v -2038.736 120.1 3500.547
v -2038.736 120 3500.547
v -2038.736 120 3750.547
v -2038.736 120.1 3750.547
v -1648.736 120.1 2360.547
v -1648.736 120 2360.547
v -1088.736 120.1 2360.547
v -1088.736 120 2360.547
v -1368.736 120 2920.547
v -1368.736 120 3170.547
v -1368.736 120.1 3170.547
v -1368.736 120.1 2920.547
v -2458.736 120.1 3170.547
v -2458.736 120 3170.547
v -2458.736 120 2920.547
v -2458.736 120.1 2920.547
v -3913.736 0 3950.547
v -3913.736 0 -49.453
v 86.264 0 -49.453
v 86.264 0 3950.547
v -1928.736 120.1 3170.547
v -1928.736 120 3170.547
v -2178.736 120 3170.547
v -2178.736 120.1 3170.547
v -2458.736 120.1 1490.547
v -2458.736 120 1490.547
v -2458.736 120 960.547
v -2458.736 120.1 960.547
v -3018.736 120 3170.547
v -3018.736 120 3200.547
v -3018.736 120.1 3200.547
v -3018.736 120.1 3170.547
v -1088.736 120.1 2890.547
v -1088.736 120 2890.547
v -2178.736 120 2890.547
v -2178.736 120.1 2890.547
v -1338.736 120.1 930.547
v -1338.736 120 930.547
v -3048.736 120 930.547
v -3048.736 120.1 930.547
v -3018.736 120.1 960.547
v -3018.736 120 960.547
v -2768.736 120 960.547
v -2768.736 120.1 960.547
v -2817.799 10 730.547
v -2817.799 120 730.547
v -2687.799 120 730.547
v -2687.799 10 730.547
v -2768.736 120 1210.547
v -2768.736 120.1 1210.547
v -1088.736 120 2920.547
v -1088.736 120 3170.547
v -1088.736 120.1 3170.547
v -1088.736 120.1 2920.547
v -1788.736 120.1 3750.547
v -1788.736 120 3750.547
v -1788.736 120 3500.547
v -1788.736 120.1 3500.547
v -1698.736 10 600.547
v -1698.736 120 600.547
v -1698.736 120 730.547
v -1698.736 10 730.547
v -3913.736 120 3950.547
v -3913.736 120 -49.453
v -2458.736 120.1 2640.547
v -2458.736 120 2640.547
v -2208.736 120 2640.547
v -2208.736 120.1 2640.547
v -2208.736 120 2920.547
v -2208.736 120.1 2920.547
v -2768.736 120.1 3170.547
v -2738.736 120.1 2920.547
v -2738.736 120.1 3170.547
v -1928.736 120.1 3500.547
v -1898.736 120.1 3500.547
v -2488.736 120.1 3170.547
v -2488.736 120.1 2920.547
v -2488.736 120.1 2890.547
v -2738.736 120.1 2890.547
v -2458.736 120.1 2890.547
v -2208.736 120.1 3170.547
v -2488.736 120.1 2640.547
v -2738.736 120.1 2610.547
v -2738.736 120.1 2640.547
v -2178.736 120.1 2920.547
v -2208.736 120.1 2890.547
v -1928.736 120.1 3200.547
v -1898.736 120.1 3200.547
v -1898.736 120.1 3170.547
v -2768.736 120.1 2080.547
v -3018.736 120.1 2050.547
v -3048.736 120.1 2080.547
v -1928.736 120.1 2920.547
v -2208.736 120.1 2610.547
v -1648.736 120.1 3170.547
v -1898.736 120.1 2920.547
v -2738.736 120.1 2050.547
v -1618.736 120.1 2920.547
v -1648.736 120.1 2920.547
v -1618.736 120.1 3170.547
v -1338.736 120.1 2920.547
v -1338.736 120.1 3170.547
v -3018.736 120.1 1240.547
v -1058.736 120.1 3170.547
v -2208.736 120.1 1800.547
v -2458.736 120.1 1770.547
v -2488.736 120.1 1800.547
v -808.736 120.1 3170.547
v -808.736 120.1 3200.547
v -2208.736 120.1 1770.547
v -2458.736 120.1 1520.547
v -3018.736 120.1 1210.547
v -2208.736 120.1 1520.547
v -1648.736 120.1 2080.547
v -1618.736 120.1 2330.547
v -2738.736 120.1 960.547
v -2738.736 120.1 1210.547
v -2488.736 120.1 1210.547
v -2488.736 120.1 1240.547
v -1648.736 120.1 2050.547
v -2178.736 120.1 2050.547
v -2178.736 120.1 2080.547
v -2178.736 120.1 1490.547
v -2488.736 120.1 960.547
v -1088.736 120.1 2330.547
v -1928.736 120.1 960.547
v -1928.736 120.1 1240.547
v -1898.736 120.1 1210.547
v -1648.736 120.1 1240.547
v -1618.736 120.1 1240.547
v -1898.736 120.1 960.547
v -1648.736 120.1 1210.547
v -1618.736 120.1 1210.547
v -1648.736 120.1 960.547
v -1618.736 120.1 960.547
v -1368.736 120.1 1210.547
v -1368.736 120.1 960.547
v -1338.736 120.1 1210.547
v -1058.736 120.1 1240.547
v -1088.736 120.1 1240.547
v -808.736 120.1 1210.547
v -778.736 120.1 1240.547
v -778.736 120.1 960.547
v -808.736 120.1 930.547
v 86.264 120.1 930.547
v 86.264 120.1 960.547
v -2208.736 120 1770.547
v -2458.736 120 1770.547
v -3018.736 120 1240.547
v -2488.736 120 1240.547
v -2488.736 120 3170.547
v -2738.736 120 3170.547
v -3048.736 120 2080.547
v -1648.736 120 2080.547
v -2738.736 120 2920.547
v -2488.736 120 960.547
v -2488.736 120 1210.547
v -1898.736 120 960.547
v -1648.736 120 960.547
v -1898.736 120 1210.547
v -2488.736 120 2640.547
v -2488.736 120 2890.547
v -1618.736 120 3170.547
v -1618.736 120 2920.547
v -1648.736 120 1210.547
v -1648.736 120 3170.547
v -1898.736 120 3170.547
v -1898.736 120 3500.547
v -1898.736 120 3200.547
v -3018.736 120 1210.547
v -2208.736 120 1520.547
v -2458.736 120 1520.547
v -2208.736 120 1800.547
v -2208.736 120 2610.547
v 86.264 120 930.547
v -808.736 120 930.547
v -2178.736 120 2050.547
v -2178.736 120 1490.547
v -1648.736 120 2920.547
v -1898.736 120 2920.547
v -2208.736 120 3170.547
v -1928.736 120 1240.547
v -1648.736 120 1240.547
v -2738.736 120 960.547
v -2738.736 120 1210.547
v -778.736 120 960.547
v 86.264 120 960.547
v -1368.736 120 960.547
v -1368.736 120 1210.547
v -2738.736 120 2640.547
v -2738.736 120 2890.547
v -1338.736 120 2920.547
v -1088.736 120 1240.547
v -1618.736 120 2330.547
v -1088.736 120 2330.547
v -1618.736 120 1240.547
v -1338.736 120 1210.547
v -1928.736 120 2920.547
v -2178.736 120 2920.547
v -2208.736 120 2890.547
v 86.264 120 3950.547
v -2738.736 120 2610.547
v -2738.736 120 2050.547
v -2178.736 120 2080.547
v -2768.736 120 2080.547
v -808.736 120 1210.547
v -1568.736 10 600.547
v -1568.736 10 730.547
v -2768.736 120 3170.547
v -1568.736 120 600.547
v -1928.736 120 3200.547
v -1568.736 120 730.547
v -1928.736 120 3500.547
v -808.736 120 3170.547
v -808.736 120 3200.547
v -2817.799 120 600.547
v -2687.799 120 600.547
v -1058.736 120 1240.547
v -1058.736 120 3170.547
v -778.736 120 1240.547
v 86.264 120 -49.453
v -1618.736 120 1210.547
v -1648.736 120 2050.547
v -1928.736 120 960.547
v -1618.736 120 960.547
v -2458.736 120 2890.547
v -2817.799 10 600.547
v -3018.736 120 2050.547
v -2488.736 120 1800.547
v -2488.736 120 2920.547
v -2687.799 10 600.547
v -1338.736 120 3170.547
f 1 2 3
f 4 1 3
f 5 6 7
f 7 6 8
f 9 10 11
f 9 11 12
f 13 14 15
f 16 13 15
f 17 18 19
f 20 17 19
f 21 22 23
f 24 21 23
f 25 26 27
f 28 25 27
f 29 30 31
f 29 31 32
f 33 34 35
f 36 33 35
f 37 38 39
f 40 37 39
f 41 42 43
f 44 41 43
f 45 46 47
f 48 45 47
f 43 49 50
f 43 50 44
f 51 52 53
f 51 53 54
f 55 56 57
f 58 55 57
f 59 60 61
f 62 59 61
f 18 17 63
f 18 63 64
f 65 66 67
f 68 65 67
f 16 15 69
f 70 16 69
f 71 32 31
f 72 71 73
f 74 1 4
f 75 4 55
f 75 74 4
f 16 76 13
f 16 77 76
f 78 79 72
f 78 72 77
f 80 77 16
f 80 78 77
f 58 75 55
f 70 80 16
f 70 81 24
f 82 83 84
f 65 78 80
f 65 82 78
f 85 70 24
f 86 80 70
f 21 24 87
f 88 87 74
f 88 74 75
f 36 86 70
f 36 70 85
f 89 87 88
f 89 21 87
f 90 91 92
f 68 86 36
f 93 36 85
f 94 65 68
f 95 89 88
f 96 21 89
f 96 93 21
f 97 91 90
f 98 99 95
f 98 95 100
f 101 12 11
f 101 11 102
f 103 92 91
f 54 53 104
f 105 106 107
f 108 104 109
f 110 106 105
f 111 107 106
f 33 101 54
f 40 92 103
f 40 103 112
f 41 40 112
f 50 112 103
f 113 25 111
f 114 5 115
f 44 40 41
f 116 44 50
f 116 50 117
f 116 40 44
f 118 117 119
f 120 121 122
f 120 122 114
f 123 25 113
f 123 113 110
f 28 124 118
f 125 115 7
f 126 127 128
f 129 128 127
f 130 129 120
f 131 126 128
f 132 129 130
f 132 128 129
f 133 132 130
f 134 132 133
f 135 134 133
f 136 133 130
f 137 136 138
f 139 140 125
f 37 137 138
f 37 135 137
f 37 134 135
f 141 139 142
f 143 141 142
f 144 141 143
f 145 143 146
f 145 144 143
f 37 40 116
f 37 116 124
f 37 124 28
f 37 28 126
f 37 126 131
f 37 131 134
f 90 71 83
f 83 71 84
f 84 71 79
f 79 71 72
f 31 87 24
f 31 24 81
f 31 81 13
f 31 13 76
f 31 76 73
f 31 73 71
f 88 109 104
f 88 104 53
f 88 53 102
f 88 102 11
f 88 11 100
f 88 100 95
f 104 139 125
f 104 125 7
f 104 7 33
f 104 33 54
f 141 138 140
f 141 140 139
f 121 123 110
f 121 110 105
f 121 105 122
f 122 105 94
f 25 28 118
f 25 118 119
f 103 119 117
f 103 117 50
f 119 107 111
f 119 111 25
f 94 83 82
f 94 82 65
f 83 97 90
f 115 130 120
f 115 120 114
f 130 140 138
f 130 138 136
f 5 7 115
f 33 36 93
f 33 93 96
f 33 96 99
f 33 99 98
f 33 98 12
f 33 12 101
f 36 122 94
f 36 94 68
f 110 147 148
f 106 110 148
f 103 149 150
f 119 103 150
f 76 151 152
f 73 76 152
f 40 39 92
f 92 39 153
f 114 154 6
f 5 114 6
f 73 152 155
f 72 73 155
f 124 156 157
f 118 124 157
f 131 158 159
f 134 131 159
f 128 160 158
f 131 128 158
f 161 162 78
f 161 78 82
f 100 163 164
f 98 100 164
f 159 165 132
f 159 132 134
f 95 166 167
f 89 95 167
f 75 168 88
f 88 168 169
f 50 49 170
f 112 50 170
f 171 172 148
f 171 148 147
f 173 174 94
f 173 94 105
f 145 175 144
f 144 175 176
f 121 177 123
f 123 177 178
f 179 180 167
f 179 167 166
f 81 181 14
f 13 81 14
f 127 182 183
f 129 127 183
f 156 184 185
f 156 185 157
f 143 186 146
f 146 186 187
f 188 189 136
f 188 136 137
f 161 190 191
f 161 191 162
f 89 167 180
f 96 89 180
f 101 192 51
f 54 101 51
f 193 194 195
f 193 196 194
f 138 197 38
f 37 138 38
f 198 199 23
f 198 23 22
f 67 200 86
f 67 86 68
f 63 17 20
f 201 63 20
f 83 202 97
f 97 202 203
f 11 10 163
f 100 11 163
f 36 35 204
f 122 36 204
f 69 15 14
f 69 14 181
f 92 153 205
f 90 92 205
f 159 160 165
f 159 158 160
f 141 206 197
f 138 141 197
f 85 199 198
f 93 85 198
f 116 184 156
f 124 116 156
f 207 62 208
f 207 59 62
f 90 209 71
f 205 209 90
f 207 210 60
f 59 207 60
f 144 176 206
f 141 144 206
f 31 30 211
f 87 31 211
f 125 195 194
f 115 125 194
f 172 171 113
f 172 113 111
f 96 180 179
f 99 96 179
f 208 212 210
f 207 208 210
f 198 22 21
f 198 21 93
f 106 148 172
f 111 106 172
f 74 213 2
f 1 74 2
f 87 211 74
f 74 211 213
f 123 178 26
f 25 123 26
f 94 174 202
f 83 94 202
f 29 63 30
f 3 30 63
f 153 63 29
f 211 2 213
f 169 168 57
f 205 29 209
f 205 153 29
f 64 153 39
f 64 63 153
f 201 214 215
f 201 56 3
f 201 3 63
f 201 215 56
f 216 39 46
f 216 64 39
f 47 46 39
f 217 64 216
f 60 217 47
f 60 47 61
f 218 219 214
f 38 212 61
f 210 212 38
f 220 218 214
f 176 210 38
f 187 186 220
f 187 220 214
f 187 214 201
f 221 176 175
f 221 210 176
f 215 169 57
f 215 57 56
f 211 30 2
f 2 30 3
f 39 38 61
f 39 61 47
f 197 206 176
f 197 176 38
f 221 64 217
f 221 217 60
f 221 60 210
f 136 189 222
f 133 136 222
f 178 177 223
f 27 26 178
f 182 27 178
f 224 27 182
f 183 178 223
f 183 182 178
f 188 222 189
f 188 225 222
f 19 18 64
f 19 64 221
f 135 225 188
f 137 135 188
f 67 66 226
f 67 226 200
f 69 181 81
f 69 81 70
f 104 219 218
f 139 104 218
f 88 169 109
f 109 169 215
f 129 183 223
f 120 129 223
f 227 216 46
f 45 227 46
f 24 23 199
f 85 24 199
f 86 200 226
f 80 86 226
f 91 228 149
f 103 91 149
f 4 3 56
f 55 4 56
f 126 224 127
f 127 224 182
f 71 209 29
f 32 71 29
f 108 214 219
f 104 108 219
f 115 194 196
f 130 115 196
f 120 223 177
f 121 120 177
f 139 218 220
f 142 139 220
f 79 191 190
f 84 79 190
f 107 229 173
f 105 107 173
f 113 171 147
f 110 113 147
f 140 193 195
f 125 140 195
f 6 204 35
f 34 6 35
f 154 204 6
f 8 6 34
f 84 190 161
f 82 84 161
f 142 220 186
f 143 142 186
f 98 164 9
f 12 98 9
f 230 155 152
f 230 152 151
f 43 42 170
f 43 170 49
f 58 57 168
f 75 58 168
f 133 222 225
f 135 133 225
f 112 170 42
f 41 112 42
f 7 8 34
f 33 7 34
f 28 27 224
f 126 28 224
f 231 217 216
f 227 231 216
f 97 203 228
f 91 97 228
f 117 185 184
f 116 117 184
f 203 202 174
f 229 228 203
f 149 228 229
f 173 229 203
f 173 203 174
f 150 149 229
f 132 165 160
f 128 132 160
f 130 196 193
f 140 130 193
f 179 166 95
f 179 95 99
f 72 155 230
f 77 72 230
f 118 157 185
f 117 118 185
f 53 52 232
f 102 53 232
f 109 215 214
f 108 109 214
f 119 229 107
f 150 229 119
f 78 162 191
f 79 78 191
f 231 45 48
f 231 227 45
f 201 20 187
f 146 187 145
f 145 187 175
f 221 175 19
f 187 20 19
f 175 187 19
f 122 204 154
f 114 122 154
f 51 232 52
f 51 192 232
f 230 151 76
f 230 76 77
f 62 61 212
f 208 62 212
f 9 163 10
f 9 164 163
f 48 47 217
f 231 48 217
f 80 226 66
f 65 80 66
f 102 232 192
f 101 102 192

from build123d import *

# Parameters (mm, degrees)
SKETCH1_W                 = 4000
SKETCH1_H                 = 4000
BOSS_EXTRUDE1_DEPTH       = 120
START_DEPTH               = 0.1
SKETCH5_W                 = 1090
SKETCH5_H                 = 30
FIRST_LINE_DEPTH          = 0.1
SKETCH7_W                 = 30
SKETCH7_H                 = 250
SKETCH7_H_2               = 30
SKETCH7_W_2               = 250
FIRST_SET_OF_GRIDS_DEPTH  = 0.1
SKETCH9_W                 = 30
SKETCH9_H                 = 250
SKETCH9_H_2               = 30
SKETCH9_W_2               = 250
SECOND_SET_OF_GRIDS_DEPTH = 0.1
SKETCH10_W                = 30
SKETCH10_H                = 280
THIRD_SET_DEPTH           = 0.1
SKETCH13_W                = 30
SKETCH13_H                = 30
SKETCH13_W_2              = 250
SKETCH13_H_2              = 250
F_4TH_SET_DEPTH           = 0.1
SKETCH14_W                = 30
SKETCH14_H                = 250
SKETCH14_H_2              = 30
SKETCH14_W_2              = 250
F_5TH_SET_DEPTH           = 0.1
SKETCH15_W                = 30
SKETCH15_H                = 250
SKETCH15_H_2              = 30
F_6TH_SET_DEPTH           = 0.1
SKETCH16_W                = 30
SKETCH16_H                = 250
SKETCH16_H_2              = 30
SKETCH16_W_2              = 250
F_7TH_SET_DEPTH           = 0.1
SKETCH17_W                = 30
SKETCH17_H                = 250
SKETCH17_H_2              = 30
SKETCH17_W_2              = 250
SKETCH17_W_3              = 865
F_8TH_SET_DEPTH           = 0.1
CAVITIES_DEPTH            = 110


with BuildPart() as part:
    # Sketch1 → Boss-Extrude1 (new body)
    with BuildSketch(Plane(origin=(0, 0, 0), x_dir=(1, 0, 0), z_dir=(0, 1, 0))):
        with Locations((-1913.736021211, -1950.54740935)):
            Rectangle(SKETCH1_W, SKETCH1_H)
    extrude(amount=BOSS_EXTRUDE1_DEPTH)

    # Sketch4 → Start (add)
    with BuildSketch(Plane(origin=(0, 120, 0), x_dir=(1, 0, 0), z_dir=(0, 1, 0))):
        Polygon((-2038.736021211, -3500.54740935), (-2038.736021211, -3750.54740935), (-1913.736021211, -3750.54740935), (-1788.736021211, -3750.54740935), (-1788.736021211, -3500.54740935), align=None)
    extrude(amount=START_DEPTH)

    # Sketch5 → First line (add)
    with BuildSketch(Plane(origin=(0, 120, 0), x_dir=(1, 0, 0), z_dir=(0, 1, 0))):
        with Locations((-1353.736021211, -3185.54740935)):
            Rectangle(SKETCH5_W, SKETCH5_H)
        with Locations((-2473.736021211, -3185.54740935)):
            Rectangle(SKETCH5_W, SKETCH5_H)
        Polygon((-1928.736021211, -3500.54740935), (-1913.736021211, -3500.54740935), (-1913.736021211, -3239.780731093), (-1913.736021211, -3233.358018457), (-1913.736021211, -3200.54740935), (-1928.736021211, -3200.54740935), align=None)
        Polygon((-1913.736021211, -3239.780731093), (-1913.736021211, -3500.54740935), (-1898.736021211, -3500.54740935), (-1898.736021211, -3200.54740935), (-1913.736021211, -3200.54740935), (-1913.736021211, -3233.358018457), align=None)
        Polygon((-1898.736021211, -3170.54740935), (-1898.736021211, -3200.54740935), (-1913.736021211, -3200.54740935), (-1928.736021211, -3200.54740935), (-1928.736021211, -3170.54740935), align=None)
    extrude(amount=FIRST_LINE_DEPTH)

    # Sketch7 → First set of grids (add)
    with BuildSketch(Plane(origin=(0, 120, 0), x_dir=(1, 0, 0), z_dir=(0, 1, 0))):
        with Locations((-2753.736021211, -3045.54740935)):
            Rectangle(SKETCH7_W, SKETCH7_H)
        with Locations((-2753.736021211, -2905.54740935)):
            Rectangle(SKETCH7_W, SKETCH7_H_2)
        with Locations((-2613.736021211, -2905.54740935)):
            Rectangle(SKETCH7_W_2, SKETCH7_H_2)
        with Locations((-2473.736021211, -2905.54740935)):
            Rectangle(SKETCH7_W, SKETCH7_H_2)
        with Locations((-2473.736021211, -3045.54740935)):
            Rectangle(SKETCH7_W, SKETCH7_H)
        with Locations((-2333.736021211, -2905.54740935)):
            Rectangle(SKETCH7_W_2, SKETCH7_H_2)
        with Locations((-2193.736021211, -2905.54740935)):
            Rectangle(SKETCH7_W, SKETCH7_H_2)
        with Locations((-2193.736021211, -3045.54740935)):
            Rectangle(SKETCH7_W, SKETCH7_H)
        with Locations((-2053.736021211, -2905.54740935)):
            Rectangle(SKETCH7_W_2, SKETCH7_H_2)
        with Locations((-1913.736021211, -2905.54740935)):
            Rectangle(SKETCH7_W, SKETCH7_H_2)
        with Locations((-1773.736021211, -2905.54740935)):
            Rectangle(SKETCH7_W_2, SKETCH7_H_2)
        with Locations((-1913.736021211, -3045.54740935)):
            Rectangle(SKETCH7_W, SKETCH7_H)
        with Locations((-1493.736021211, -2905.54740935)):
            Rectangle(SKETCH7_W_2, SKETCH7_H_2)
        with Locations((-1633.736021211, -2905.54740935)):
            Rectangle(SKETCH7_W, SKETCH7_H_2)
        with Locations((-1633.736021211, -3045.54740935)):
            Rectangle(SKETCH7_W, SKETCH7_H)
        with Locations((-1353.736021211, -2905.54740935)):
            Rectangle(SKETCH7_W, SKETCH7_H_2)
        with Locations((-1353.736021211, -3045.54740935)):
            Rectangle(SKETCH7_W, SKETCH7_H)
        with Locations((-1213.736021211, -2905.54740935)):
            Rectangle(SKETCH7_W_2, SKETCH7_H_2)
        with Locations((-1073.736021211, -2905.54740935)):
            Rectangle(SKETCH7_W, SKETCH7_H_2)
        with Locations((-1073.736021211, -3045.54740935)):
            Rectangle(SKETCH7_W, SKETCH7_H)
    extrude(amount=FIRST_SET_OF_GRIDS_DEPTH)

    # Sketch9 → Second Set of grids (add)
    with BuildSketch(Plane(origin=(0, 120, 0), x_dir=(1, 0, 0), z_dir=(0, 1, 0))):
        with Locations((-2753.736021211, -2765.54740935)):
            Rectangle(SKETCH9_W, SKETCH9_H)
        with Locations((-2753.736021211, -2625.54740935)):
            Rectangle(SKETCH9_W, SKETCH9_H_2)
        with Locations((-2613.736021211, -2625.54740935)):
            Rectangle(SKETCH9_W_2, SKETCH9_H_2)
        with Locations((-2473.736021211, -2625.54740935)):
            Rectangle(SKETCH9_W, SKETCH9_H_2)
        with Locations((-2473.736021211, -2765.54740935)):
            Rectangle(SKETCH9_W, SKETCH9_H)
        with Locations((-2333.736021211, -2625.54740935)):
            Rectangle(SKETCH9_W_2, SKETCH9_H_2)
        with Locations((-2193.736021211, -2625.54740935)):
            Rectangle(SKETCH9_W, SKETCH9_H_2)
        with Locations((-2193.736021211, -2765.54740935)):
            Rectangle(SKETCH9_W, SKETCH9_H)
        with Locations((-1073.736021211, -2765.54740935)):
            Rectangle(SKETCH9_W, SKETCH9_H)
        with Locations((-1073.736021211, -2625.54740935)):
            Rectangle(SKETCH9_W, SKETCH9_H_2)
    extrude(amount=SECOND_SET_OF_GRIDS_DEPTH)

    # Sketch10 → Third Set (add)
    with BuildSketch(Plane(origin=(0, 120, 0), x_dir=(1, 0, 0), z_dir=(0, 1, 0))):
        with Locations((-2753.736021211, -2470.54740935)):
            Rectangle(SKETCH10_W, SKETCH10_H)
        with Locations((-2193.736021211, -2470.54740935)):
            Rectangle(SKETCH10_W, SKETCH10_H)
        Polygon((-1088.736021211, -2610.54740935), (-1058.736021211, -2610.54740935), (-1058.736021211, -2330.54740935), (-1648.736021211, -2330.54740935), (-1648.736021211, -2360.54740935), (-1088.736021211, -2360.54740935), align=None)
    extrude(amount=THIRD_SET_DEPTH)

    # Sketch13 → 4th set (add)
    with BuildSketch(Plane(origin=(0, 120, 0), x_dir=(1, 0, 0), z_dir=(0, 1, 0))):
        with Locations((-3033.736021211, -2065.54740935)):
            Rectangle(SKETCH13_W, SKETCH13_H)
        with Locations((-2893.736021211, -2065.54740935)):
            Rectangle(SKETCH13_W_2, SKETCH13_H)
        with Locations((-2753.736021211, -2065.54740935)):
            Rectangle(SKETCH13_W, SKETCH13_H)
        with Locations((-2753.736021211, -2205.54740935)):
            Rectangle(SKETCH13_W, SKETCH13_H_2)
        with Locations((-2193.736021211, -2205.54740935)):
            Rectangle(SKETCH13_W, SKETCH13_H_2)
        with Locations((-2193.736021211, -2065.54740935)):
            Rectangle(SKETCH13_W, SKETCH13_H)
        with Locations((-2053.736021211, -2065.54740935)):
            Rectangle(SKETCH13_W_2, SKETCH13_H)
        with Locations((-1773.736021211, -2065.54740935)):
            Rectangle(SKETCH13_W_2, SKETCH13_H)
        with Locations((-1913.736021211, -2065.54740935)):
            Rectangle(SKETCH13_W, SKETCH13_H)
        with Locations((-1633.736021211, -2065.54740935)):
            Rectangle(SKETCH13_W, SKETCH13_H)
        with Locations((-1633.736021211, -2205.54740935)):
            Rectangle(SKETCH13_W, SKETCH13_H_2)
        with Locations((-1073.736021211, -2205.54740935)):
            Rectangle(SKETCH13_W, SKETCH13_H_2)
        with Locations((-1073.736021211, -2065.54740935)):
            Rectangle(SKETCH13_W, SKETCH13_H)
    extrude(amount=F_4TH_SET_DEPTH)

    # Sketch14 → 5th set (add)
    with BuildSketch(Plane(origin=(0, 120, 0), x_dir=(1, 0, 0), z_dir=(0, 1, 0))):
        with Locations((-3033.736021211, -1925.54740935)):
            Rectangle(SKETCH14_W, SKETCH14_H)
        with Locations((-3033.736021211, -1785.54740935)):
            Rectangle(SKETCH14_W, SKETCH14_H_2)
        with Locations((-2333.736021211, -1785.54740935)):
            Rectangle(SKETCH14_W_2, SKETCH14_H_2)
        with Locations((-2473.736021211, -1785.54740935)):
            Rectangle(SKETCH14_W, SKETCH14_H_2)
        with Locations((-2193.736021211, -1785.54740935)):
            Rectangle(SKETCH14_W, SKETCH14_H_2)
        with Locations((-2193.736021211, -1925.54740935)):
            Rectangle(SKETCH14_W, SKETCH14_H)
        with Locations((-1633.736021211, -1925.54740935)):
            Rectangle(SKETCH14_W, SKETCH14_H)
        with Locations((-1633.736021211, -1785.54740935)):
            Rectangle(SKETCH14_W, SKETCH14_H_2)
        with Locations((-1073.736021211, -1925.54740935)):
            Rectangle(SKETCH14_W, SKETCH14_H)
        with Locations((-1073.736021211, -1785.54740935)):
            Rectangle(SKETCH14_W, SKETCH14_H_2)
    extrude(amount=F_5TH_SET_DEPTH)

    # Sketch15 → 6th set (add)
    with BuildSketch(Plane(origin=(0, 120, 0), x_dir=(1, 0, 0), z_dir=(0, 1, 0))):
        with Locations((-3033.736021211, -1645.54740935)):
            Rectangle(SKETCH15_W, SKETCH15_H)
        with Locations((-3033.736021211, -1505.54740935)):
            Rectangle(SKETCH15_W, SKETCH15_H_2)
        with Locations((-2473.736021211, -1645.54740935)):
            Rectangle(SKETCH15_W, SKETCH15_H)
        Polygon((-2458.736021211, -1520.54740935), (-2488.736021211, -1520.54740935), (-2488.736021211, -1490.54740935), (-2458.736021211, -1490.54740935), (-2208.736021211, -1490.54740935), (-2208.736021211, -1520.54740935), align=None)
        Polygon((-2208.736021211, -1520.54740935), (-2208.736021211, -1770.54740935), (-2178.736021211, -1770.54740935), (-2178.736021211, -1520.54740935), (-2178.736021211, -1490.54740935), (-2208.736021211, -1490.54740935), align=None)
        with Locations((-1633.736021211, -1645.54740935)):
            Rectangle(SKETCH15_W, SKETCH15_H)
        with Locations((-1073.736021211, -1645.54740935)):
            Rectangle(SKETCH15_W, SKETCH15_H)
        with Locations((-1073.736021211, -1505.54740935)):
            Rectangle(SKETCH15_W, SKETCH15_H_2)
        with Locations((-1633.736021211, -1505.54740935)):
            Rectangle(SKETCH15_W, SKETCH15_H_2)
    extrude(amount=F_6TH_SET_DEPTH)

    # Sketch16 → 7th set (add)
    with BuildSketch(Plane(origin=(0, 120, 0), x_dir=(1, 0, 0), z_dir=(0, 1, 0))):
        with Locations((-3033.736021211, -1365.54740935)):
            Rectangle(SKETCH16_W, SKETCH16_H)
        with Locations((-3033.736021211, -1225.54740935)):
            Rectangle(SKETCH16_W, SKETCH16_H_2)
        with Locations((-2893.736021211, -1225.54740935)):
            Rectangle(SKETCH16_W_2, SKETCH16_H_2)
        with Locations((-2753.736021211, -1225.54740935)):
            Rectangle(SKETCH16_W, SKETCH16_H_2)
        with Locations((-2613.736021211, -1225.54740935)):
            Rectangle(SKETCH16_W_2, SKETCH16_H_2)
        with Locations((-2473.736021211, -1365.54740935)):
            Rectangle(SKETCH16_W, SKETCH16_H)
        with Locations((-2473.736021211, -1225.54740935)):
            Rectangle(SKETCH16_W, SKETCH16_H_2)
        with Locations((-1633.736021211, -1365.54740935)):
            Rectangle(SKETCH16_W, SKETCH16_H)
        with Locations((-1773.736021211, -1225.54740935)):
            Rectangle(SKETCH16_W_2, SKETCH16_H_2)
        with Locations((-1913.736021211, -1225.54740935)):
            Rectangle(SKETCH16_W, SKETCH16_H_2)
        with Locations((-1633.736021211, -1225.54740935)):
            Rectangle(SKETCH16_W, SKETCH16_H_2)
        with Locations((-1493.736021211, -1225.54740935)):
            Rectangle(SKETCH16_W_2, SKETCH16_H_2)
        with Locations((-1353.736021211, -1225.54740935)):
            Rectangle(SKETCH16_W, SKETCH16_H_2)
        with Locations((-1213.736021211, -1225.54740935)):
            Rectangle(SKETCH16_W_2, SKETCH16_H_2)
        with Locations((-933.736021211, -1225.54740935)):
            Rectangle(SKETCH16_W_2, SKETCH16_H_2)
        with Locations((-793.736021211, -1225.54740935)):
            Rectangle(SKETCH16_W, SKETCH16_H_2)
        with Locations((-1073.736021211, -1225.54740935)):
            Rectangle(SKETCH16_W, SKETCH16_H_2)
        with Locations((-1073.736021211, -1365.54740935)):
            Rectangle(SKETCH16_W, SKETCH16_H)
    extrude(amount=F_7TH_SET_DEPTH)

    # Sketch17 → 8th set (add)
    with BuildSketch(Plane(origin=(0, 120, 0), x_dir=(1, 0, 0), z_dir=(0, 1, 0))):
        with Locations((-3033.736021211, -1085.54740935)):
            Rectangle(SKETCH17_W, SKETCH17_H)
        with Locations((-3033.736021211, -945.54740935)):
            Rectangle(SKETCH17_W, SKETCH17_H_2)
        with Locations((-2893.736021211, -945.54740935)):
            Rectangle(SKETCH17_W_2, SKETCH17_H_2)
        with Locations((-2753.736021211, -945.54740935)):
            Rectangle(SKETCH17_W, SKETCH17_H_2)
        with Locations((-2613.736021211, -945.54740935)):
            Rectangle(SKETCH17_W_2, SKETCH17_H_2)
        with Locations((-2753.736021211, -1085.54740935)):
            Rectangle(SKETCH17_W, SKETCH17_H)
        Polygon((-2488.736021211, -960.54740935), (-2488.736021211, -1210.54740935), (-2458.736021211, -1210.54740935), (-2458.736021211, -960.54740935), (-2458.736021211, -930.54740935), (-2488.736021211, -930.54740935), align=None)
        with Locations((-2333.736021211, -945.54740935)):
            Rectangle(SKETCH17_W_2, SKETCH17_H_2)
        with Locations((-2193.736021211, -945.54740935)):
            Rectangle(SKETCH17_W, SKETCH17_H_2)
        with Locations((-2053.736021211, -945.54740935)):
            Rectangle(SKETCH17_W_2, SKETCH17_H_2)
        Polygon((-1928.736021211, -930.54740935), (-1928.736021211, -960.54740935), (-1928.736021211, -1210.54740935), (-1898.736021211, -1210.54740935), (-1898.736021211, -960.54740935), (-1898.736021211, -930.54740935), align=None)
        with Locations((-1773.736021211, -945.54740935)):
            Rectangle(SKETCH17_W_2, SKETCH17_H_2)
        with Locations((-1633.736021211, -945.54740935)):
            Rectangle(SKETCH17_W, SKETCH17_H_2)
        with Locations((-1633.736021211, -1085.54740935)):
            Rectangle(SKETCH17_W, SKETCH17_H)
        with Locations((-1493.736021211, -945.54740935)):
            Rectangle(SKETCH17_W_2, SKETCH17_H_2)
        with Locations((-1353.736021211, -945.54740935)):
            Rectangle(SKETCH17_W, SKETCH17_H_2)
        with Locations((-1353.736021211, -1085.54740935)):
            Rectangle(SKETCH17_W, SKETCH17_H)
        with Locations((-793.736021211, -1085.54740935)):
            Rectangle(SKETCH17_W, SKETCH17_H)
        with Locations((-793.736021211, -945.54740935)):
            Rectangle(SKETCH17_W, SKETCH17_H_2)
        with Locations((-346.236021211, -945.54740935)):
            Rectangle(SKETCH17_W_3, SKETCH17_H_2)
    extrude(amount=F_8TH_SET_DEPTH)

    # Sketch18 → Cavities (cut)
    with BuildSketch(Plane(origin=(0, 120, 0), x_dir=(1, 0, 0), z_dir=(0, 1, 0))):
        Polygon((-2817.799107354, -730.54740935), (-2767.799107354, -730.54740935), (-2752.799107354, -730.54740935), (-2737.799107354, -730.54740935), (-2687.799107354, -730.54740935), (-2687.799107354, -600.54740935), (-2817.799107354, -600.54740935), align=None)
        Polygon((-1698.736021211, -730.54740935), (-1648.736021211, -730.54740935), (-1633.736021211, -730.54740935), (-1618.736021211, -730.54740935), (-1568.736021211, -730.54740935), (-1568.736021211, -600.54740935), (-1698.736021211, -600.54740935), align=None)
    extrude(amount=-CAVITIES_DEPTH, mode=Mode.SUBTRACT)


solid = part.part
